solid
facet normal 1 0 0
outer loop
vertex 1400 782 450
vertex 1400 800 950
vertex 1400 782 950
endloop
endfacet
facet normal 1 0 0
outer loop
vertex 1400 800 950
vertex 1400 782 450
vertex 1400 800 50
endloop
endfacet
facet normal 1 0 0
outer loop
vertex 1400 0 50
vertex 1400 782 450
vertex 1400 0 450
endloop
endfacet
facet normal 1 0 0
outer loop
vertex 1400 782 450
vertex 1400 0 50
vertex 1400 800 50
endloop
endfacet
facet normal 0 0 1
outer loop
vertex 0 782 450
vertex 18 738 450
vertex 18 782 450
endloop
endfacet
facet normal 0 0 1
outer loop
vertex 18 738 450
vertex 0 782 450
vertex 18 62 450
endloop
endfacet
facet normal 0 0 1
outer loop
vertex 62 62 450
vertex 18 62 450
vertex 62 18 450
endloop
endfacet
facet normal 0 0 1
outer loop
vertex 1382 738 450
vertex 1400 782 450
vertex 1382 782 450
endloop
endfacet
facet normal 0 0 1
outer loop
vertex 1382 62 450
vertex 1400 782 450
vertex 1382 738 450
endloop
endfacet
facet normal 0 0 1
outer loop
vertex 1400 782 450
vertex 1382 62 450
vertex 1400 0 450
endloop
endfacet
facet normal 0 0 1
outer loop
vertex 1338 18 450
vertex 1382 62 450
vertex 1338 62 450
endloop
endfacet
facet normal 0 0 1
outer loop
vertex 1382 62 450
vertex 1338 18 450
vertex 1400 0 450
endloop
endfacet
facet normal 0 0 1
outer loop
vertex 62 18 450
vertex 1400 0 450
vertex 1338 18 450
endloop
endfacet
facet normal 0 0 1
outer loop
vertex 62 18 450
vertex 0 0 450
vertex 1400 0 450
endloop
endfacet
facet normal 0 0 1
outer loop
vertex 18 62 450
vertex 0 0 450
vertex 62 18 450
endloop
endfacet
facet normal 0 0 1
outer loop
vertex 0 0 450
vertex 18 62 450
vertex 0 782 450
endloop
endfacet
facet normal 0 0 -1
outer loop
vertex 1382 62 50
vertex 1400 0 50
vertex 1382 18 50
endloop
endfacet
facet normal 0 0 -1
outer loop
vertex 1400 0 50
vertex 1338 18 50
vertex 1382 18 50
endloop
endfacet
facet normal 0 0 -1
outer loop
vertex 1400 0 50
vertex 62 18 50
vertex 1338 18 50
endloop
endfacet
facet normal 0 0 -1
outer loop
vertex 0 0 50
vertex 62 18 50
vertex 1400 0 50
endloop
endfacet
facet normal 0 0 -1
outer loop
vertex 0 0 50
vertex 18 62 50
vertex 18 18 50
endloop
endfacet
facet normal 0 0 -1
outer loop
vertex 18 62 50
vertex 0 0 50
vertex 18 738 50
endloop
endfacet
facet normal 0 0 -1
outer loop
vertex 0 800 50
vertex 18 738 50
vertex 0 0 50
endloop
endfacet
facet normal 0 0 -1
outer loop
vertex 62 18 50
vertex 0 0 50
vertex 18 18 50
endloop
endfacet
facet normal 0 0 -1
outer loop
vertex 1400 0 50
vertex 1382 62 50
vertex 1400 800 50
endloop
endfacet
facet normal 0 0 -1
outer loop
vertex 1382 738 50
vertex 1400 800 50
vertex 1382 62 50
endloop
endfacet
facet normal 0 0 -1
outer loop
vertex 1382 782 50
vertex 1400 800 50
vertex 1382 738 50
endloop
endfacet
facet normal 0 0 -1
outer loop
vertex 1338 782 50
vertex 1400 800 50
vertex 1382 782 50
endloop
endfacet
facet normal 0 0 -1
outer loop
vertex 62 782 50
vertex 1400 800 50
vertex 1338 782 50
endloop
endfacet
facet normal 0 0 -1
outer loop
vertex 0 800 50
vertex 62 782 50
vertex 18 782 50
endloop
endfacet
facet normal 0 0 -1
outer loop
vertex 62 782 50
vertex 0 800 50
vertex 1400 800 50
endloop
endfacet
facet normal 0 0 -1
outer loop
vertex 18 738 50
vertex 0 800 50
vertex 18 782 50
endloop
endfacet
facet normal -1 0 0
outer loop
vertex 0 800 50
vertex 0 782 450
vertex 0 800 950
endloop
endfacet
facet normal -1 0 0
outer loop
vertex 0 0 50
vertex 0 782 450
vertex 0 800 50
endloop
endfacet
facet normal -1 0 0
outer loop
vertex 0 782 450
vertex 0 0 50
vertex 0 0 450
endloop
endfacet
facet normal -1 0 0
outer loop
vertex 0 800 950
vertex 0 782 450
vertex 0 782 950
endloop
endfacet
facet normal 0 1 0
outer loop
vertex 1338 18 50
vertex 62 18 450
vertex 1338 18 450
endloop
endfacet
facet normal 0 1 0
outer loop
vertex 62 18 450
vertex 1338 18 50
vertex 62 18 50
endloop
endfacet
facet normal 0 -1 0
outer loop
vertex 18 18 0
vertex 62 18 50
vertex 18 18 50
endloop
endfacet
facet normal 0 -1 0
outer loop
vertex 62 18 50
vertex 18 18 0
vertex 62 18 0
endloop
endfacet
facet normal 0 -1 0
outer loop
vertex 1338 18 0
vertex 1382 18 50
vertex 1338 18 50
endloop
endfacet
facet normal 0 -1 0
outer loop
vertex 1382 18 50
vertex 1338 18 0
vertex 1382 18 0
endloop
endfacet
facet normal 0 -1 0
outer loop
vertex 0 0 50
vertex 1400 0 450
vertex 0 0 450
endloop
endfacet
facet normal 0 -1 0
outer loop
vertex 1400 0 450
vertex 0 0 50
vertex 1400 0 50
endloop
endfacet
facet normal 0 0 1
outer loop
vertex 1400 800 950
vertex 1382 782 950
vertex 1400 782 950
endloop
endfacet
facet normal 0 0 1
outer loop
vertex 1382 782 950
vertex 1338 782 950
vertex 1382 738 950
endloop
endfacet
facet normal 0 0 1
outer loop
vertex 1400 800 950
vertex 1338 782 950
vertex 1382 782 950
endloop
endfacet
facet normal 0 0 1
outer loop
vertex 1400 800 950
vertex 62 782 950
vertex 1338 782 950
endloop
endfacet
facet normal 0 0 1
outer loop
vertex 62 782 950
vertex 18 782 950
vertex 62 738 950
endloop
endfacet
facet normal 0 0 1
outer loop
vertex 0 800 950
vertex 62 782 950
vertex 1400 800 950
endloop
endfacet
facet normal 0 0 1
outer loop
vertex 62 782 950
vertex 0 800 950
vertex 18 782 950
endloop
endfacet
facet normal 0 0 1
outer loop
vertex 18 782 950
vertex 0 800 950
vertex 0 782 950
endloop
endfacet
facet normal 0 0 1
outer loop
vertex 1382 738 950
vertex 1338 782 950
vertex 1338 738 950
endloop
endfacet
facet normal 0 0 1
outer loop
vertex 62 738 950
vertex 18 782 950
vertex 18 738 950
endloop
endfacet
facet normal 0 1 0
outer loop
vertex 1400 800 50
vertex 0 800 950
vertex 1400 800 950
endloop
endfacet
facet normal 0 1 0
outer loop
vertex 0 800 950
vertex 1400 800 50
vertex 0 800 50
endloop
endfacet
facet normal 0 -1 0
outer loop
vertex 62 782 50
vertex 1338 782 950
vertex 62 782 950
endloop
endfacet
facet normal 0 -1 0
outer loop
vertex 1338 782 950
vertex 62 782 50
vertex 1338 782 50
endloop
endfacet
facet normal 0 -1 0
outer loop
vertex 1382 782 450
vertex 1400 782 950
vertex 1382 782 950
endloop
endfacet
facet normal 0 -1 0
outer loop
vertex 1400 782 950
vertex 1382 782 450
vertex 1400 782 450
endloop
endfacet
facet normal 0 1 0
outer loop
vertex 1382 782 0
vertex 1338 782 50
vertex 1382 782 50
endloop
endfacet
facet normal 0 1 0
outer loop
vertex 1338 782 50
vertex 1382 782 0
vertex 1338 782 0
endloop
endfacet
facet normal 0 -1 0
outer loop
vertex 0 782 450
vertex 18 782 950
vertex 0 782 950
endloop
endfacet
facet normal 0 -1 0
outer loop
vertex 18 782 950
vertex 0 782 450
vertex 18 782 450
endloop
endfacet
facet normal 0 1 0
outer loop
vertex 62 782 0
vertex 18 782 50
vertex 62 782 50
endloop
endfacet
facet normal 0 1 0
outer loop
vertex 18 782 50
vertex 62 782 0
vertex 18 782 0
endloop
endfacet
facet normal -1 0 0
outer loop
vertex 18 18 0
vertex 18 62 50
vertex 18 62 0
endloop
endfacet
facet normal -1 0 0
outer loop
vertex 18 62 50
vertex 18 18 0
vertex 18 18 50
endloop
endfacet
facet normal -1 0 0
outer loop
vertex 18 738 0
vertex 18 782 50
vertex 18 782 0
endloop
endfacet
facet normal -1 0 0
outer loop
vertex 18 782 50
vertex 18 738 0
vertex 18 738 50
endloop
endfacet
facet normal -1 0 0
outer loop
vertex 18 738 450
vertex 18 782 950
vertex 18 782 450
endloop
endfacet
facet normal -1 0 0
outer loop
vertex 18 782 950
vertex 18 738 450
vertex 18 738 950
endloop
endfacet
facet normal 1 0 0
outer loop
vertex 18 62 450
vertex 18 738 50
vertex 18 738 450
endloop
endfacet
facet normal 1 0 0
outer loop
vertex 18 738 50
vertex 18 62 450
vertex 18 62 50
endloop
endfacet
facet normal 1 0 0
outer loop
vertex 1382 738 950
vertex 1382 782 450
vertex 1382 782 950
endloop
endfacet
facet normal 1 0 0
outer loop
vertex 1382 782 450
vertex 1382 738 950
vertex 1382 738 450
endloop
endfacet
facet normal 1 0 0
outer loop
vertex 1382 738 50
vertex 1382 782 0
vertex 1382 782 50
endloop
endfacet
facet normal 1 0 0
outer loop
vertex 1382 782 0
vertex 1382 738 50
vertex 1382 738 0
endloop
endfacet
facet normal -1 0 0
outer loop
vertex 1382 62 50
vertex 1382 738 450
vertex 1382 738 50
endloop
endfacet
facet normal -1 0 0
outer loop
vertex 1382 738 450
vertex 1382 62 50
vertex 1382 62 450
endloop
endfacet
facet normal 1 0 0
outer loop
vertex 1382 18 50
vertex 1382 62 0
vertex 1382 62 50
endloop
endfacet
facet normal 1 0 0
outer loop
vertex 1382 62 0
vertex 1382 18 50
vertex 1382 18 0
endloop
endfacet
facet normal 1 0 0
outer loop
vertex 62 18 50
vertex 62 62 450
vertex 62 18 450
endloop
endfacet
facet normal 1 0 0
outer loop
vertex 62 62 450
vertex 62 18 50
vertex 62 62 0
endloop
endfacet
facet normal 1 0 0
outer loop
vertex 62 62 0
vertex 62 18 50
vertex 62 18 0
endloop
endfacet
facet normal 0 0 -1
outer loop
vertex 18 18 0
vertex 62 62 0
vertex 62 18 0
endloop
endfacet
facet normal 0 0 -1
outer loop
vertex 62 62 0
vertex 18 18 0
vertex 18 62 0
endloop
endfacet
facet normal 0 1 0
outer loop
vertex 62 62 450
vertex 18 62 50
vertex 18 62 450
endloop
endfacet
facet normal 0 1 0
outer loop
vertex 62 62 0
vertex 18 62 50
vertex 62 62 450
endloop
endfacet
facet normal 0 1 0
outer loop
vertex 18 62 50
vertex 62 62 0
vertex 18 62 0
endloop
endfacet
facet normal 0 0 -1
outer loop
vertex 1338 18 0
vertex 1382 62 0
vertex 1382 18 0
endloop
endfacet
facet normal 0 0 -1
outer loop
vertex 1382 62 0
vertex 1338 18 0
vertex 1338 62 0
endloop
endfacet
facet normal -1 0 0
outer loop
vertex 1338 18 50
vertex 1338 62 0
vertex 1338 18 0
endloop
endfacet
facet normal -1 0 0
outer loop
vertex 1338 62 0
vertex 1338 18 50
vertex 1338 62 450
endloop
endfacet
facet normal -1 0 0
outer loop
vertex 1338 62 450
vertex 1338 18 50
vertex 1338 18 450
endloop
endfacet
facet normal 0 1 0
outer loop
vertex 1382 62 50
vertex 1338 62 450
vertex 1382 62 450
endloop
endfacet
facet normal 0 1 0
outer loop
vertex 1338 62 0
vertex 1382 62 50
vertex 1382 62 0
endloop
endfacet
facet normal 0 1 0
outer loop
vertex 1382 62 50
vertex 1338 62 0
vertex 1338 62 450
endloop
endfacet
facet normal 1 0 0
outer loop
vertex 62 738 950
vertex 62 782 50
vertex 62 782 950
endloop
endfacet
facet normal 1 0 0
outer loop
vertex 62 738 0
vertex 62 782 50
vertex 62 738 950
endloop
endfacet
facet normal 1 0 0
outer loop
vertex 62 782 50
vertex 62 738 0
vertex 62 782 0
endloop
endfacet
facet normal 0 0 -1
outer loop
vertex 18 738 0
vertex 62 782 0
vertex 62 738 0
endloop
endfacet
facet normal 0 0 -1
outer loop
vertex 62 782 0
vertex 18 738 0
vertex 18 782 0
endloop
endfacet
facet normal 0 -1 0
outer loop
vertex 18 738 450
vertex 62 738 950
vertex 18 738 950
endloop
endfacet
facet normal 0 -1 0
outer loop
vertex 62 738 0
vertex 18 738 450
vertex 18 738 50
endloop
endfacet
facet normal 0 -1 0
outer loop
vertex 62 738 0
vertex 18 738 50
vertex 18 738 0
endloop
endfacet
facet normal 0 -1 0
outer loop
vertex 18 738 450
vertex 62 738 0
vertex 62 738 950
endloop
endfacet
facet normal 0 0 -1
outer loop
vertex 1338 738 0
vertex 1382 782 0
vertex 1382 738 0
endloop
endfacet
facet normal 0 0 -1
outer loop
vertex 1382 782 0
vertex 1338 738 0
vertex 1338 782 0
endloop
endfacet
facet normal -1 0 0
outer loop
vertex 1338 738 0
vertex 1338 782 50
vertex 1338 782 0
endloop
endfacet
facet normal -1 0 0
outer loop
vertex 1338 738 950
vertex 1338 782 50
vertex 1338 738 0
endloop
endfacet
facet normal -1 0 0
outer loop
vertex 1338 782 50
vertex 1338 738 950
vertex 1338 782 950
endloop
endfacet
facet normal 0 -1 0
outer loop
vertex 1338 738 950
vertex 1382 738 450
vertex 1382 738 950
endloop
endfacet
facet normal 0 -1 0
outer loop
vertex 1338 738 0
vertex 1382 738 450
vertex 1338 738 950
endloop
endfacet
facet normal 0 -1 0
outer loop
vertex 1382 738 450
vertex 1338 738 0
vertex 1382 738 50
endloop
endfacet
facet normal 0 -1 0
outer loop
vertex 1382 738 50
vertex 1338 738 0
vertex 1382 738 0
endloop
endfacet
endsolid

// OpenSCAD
/* all measurements in millimeters */
BT = 18; /* board thickness */
CD = 44; /* cleat dimension */
W = 1400; /* overall width */
BO = 50; /* bottom offset */
D = 800; /* overall depth */
FH = 400; /* front height */
BH = 900; /* back height */

module board(width, depth) {
    color("red")
    cube([width,BT,depth]);
}

module cleat(length) {
    color("blue")
    cube([CD,CD,length]);
}

/* boards (front, back, left, right): */
translate([0,0,BO]) board(W,FH);
translate([0,D-BT,BO]) board(W,BH);
translate([BT,0,BO]) rotate([0,0,90]) board(D,FH);
translate([W,0,BO]) rotate([0,0,90]) board(D,FH);
/* cleats (front left, right, back left, right) */
translate([BT,BT,0]) cleat(FH+BO);
translate([W-CD-BT,BT,0]) cleat(FH+BO);
translate([BT,D-CD-BT,0]) cleat(BH+BO);
translate([W-CD-BT,D-CD-BT,0]) cleat(BH+BO);
